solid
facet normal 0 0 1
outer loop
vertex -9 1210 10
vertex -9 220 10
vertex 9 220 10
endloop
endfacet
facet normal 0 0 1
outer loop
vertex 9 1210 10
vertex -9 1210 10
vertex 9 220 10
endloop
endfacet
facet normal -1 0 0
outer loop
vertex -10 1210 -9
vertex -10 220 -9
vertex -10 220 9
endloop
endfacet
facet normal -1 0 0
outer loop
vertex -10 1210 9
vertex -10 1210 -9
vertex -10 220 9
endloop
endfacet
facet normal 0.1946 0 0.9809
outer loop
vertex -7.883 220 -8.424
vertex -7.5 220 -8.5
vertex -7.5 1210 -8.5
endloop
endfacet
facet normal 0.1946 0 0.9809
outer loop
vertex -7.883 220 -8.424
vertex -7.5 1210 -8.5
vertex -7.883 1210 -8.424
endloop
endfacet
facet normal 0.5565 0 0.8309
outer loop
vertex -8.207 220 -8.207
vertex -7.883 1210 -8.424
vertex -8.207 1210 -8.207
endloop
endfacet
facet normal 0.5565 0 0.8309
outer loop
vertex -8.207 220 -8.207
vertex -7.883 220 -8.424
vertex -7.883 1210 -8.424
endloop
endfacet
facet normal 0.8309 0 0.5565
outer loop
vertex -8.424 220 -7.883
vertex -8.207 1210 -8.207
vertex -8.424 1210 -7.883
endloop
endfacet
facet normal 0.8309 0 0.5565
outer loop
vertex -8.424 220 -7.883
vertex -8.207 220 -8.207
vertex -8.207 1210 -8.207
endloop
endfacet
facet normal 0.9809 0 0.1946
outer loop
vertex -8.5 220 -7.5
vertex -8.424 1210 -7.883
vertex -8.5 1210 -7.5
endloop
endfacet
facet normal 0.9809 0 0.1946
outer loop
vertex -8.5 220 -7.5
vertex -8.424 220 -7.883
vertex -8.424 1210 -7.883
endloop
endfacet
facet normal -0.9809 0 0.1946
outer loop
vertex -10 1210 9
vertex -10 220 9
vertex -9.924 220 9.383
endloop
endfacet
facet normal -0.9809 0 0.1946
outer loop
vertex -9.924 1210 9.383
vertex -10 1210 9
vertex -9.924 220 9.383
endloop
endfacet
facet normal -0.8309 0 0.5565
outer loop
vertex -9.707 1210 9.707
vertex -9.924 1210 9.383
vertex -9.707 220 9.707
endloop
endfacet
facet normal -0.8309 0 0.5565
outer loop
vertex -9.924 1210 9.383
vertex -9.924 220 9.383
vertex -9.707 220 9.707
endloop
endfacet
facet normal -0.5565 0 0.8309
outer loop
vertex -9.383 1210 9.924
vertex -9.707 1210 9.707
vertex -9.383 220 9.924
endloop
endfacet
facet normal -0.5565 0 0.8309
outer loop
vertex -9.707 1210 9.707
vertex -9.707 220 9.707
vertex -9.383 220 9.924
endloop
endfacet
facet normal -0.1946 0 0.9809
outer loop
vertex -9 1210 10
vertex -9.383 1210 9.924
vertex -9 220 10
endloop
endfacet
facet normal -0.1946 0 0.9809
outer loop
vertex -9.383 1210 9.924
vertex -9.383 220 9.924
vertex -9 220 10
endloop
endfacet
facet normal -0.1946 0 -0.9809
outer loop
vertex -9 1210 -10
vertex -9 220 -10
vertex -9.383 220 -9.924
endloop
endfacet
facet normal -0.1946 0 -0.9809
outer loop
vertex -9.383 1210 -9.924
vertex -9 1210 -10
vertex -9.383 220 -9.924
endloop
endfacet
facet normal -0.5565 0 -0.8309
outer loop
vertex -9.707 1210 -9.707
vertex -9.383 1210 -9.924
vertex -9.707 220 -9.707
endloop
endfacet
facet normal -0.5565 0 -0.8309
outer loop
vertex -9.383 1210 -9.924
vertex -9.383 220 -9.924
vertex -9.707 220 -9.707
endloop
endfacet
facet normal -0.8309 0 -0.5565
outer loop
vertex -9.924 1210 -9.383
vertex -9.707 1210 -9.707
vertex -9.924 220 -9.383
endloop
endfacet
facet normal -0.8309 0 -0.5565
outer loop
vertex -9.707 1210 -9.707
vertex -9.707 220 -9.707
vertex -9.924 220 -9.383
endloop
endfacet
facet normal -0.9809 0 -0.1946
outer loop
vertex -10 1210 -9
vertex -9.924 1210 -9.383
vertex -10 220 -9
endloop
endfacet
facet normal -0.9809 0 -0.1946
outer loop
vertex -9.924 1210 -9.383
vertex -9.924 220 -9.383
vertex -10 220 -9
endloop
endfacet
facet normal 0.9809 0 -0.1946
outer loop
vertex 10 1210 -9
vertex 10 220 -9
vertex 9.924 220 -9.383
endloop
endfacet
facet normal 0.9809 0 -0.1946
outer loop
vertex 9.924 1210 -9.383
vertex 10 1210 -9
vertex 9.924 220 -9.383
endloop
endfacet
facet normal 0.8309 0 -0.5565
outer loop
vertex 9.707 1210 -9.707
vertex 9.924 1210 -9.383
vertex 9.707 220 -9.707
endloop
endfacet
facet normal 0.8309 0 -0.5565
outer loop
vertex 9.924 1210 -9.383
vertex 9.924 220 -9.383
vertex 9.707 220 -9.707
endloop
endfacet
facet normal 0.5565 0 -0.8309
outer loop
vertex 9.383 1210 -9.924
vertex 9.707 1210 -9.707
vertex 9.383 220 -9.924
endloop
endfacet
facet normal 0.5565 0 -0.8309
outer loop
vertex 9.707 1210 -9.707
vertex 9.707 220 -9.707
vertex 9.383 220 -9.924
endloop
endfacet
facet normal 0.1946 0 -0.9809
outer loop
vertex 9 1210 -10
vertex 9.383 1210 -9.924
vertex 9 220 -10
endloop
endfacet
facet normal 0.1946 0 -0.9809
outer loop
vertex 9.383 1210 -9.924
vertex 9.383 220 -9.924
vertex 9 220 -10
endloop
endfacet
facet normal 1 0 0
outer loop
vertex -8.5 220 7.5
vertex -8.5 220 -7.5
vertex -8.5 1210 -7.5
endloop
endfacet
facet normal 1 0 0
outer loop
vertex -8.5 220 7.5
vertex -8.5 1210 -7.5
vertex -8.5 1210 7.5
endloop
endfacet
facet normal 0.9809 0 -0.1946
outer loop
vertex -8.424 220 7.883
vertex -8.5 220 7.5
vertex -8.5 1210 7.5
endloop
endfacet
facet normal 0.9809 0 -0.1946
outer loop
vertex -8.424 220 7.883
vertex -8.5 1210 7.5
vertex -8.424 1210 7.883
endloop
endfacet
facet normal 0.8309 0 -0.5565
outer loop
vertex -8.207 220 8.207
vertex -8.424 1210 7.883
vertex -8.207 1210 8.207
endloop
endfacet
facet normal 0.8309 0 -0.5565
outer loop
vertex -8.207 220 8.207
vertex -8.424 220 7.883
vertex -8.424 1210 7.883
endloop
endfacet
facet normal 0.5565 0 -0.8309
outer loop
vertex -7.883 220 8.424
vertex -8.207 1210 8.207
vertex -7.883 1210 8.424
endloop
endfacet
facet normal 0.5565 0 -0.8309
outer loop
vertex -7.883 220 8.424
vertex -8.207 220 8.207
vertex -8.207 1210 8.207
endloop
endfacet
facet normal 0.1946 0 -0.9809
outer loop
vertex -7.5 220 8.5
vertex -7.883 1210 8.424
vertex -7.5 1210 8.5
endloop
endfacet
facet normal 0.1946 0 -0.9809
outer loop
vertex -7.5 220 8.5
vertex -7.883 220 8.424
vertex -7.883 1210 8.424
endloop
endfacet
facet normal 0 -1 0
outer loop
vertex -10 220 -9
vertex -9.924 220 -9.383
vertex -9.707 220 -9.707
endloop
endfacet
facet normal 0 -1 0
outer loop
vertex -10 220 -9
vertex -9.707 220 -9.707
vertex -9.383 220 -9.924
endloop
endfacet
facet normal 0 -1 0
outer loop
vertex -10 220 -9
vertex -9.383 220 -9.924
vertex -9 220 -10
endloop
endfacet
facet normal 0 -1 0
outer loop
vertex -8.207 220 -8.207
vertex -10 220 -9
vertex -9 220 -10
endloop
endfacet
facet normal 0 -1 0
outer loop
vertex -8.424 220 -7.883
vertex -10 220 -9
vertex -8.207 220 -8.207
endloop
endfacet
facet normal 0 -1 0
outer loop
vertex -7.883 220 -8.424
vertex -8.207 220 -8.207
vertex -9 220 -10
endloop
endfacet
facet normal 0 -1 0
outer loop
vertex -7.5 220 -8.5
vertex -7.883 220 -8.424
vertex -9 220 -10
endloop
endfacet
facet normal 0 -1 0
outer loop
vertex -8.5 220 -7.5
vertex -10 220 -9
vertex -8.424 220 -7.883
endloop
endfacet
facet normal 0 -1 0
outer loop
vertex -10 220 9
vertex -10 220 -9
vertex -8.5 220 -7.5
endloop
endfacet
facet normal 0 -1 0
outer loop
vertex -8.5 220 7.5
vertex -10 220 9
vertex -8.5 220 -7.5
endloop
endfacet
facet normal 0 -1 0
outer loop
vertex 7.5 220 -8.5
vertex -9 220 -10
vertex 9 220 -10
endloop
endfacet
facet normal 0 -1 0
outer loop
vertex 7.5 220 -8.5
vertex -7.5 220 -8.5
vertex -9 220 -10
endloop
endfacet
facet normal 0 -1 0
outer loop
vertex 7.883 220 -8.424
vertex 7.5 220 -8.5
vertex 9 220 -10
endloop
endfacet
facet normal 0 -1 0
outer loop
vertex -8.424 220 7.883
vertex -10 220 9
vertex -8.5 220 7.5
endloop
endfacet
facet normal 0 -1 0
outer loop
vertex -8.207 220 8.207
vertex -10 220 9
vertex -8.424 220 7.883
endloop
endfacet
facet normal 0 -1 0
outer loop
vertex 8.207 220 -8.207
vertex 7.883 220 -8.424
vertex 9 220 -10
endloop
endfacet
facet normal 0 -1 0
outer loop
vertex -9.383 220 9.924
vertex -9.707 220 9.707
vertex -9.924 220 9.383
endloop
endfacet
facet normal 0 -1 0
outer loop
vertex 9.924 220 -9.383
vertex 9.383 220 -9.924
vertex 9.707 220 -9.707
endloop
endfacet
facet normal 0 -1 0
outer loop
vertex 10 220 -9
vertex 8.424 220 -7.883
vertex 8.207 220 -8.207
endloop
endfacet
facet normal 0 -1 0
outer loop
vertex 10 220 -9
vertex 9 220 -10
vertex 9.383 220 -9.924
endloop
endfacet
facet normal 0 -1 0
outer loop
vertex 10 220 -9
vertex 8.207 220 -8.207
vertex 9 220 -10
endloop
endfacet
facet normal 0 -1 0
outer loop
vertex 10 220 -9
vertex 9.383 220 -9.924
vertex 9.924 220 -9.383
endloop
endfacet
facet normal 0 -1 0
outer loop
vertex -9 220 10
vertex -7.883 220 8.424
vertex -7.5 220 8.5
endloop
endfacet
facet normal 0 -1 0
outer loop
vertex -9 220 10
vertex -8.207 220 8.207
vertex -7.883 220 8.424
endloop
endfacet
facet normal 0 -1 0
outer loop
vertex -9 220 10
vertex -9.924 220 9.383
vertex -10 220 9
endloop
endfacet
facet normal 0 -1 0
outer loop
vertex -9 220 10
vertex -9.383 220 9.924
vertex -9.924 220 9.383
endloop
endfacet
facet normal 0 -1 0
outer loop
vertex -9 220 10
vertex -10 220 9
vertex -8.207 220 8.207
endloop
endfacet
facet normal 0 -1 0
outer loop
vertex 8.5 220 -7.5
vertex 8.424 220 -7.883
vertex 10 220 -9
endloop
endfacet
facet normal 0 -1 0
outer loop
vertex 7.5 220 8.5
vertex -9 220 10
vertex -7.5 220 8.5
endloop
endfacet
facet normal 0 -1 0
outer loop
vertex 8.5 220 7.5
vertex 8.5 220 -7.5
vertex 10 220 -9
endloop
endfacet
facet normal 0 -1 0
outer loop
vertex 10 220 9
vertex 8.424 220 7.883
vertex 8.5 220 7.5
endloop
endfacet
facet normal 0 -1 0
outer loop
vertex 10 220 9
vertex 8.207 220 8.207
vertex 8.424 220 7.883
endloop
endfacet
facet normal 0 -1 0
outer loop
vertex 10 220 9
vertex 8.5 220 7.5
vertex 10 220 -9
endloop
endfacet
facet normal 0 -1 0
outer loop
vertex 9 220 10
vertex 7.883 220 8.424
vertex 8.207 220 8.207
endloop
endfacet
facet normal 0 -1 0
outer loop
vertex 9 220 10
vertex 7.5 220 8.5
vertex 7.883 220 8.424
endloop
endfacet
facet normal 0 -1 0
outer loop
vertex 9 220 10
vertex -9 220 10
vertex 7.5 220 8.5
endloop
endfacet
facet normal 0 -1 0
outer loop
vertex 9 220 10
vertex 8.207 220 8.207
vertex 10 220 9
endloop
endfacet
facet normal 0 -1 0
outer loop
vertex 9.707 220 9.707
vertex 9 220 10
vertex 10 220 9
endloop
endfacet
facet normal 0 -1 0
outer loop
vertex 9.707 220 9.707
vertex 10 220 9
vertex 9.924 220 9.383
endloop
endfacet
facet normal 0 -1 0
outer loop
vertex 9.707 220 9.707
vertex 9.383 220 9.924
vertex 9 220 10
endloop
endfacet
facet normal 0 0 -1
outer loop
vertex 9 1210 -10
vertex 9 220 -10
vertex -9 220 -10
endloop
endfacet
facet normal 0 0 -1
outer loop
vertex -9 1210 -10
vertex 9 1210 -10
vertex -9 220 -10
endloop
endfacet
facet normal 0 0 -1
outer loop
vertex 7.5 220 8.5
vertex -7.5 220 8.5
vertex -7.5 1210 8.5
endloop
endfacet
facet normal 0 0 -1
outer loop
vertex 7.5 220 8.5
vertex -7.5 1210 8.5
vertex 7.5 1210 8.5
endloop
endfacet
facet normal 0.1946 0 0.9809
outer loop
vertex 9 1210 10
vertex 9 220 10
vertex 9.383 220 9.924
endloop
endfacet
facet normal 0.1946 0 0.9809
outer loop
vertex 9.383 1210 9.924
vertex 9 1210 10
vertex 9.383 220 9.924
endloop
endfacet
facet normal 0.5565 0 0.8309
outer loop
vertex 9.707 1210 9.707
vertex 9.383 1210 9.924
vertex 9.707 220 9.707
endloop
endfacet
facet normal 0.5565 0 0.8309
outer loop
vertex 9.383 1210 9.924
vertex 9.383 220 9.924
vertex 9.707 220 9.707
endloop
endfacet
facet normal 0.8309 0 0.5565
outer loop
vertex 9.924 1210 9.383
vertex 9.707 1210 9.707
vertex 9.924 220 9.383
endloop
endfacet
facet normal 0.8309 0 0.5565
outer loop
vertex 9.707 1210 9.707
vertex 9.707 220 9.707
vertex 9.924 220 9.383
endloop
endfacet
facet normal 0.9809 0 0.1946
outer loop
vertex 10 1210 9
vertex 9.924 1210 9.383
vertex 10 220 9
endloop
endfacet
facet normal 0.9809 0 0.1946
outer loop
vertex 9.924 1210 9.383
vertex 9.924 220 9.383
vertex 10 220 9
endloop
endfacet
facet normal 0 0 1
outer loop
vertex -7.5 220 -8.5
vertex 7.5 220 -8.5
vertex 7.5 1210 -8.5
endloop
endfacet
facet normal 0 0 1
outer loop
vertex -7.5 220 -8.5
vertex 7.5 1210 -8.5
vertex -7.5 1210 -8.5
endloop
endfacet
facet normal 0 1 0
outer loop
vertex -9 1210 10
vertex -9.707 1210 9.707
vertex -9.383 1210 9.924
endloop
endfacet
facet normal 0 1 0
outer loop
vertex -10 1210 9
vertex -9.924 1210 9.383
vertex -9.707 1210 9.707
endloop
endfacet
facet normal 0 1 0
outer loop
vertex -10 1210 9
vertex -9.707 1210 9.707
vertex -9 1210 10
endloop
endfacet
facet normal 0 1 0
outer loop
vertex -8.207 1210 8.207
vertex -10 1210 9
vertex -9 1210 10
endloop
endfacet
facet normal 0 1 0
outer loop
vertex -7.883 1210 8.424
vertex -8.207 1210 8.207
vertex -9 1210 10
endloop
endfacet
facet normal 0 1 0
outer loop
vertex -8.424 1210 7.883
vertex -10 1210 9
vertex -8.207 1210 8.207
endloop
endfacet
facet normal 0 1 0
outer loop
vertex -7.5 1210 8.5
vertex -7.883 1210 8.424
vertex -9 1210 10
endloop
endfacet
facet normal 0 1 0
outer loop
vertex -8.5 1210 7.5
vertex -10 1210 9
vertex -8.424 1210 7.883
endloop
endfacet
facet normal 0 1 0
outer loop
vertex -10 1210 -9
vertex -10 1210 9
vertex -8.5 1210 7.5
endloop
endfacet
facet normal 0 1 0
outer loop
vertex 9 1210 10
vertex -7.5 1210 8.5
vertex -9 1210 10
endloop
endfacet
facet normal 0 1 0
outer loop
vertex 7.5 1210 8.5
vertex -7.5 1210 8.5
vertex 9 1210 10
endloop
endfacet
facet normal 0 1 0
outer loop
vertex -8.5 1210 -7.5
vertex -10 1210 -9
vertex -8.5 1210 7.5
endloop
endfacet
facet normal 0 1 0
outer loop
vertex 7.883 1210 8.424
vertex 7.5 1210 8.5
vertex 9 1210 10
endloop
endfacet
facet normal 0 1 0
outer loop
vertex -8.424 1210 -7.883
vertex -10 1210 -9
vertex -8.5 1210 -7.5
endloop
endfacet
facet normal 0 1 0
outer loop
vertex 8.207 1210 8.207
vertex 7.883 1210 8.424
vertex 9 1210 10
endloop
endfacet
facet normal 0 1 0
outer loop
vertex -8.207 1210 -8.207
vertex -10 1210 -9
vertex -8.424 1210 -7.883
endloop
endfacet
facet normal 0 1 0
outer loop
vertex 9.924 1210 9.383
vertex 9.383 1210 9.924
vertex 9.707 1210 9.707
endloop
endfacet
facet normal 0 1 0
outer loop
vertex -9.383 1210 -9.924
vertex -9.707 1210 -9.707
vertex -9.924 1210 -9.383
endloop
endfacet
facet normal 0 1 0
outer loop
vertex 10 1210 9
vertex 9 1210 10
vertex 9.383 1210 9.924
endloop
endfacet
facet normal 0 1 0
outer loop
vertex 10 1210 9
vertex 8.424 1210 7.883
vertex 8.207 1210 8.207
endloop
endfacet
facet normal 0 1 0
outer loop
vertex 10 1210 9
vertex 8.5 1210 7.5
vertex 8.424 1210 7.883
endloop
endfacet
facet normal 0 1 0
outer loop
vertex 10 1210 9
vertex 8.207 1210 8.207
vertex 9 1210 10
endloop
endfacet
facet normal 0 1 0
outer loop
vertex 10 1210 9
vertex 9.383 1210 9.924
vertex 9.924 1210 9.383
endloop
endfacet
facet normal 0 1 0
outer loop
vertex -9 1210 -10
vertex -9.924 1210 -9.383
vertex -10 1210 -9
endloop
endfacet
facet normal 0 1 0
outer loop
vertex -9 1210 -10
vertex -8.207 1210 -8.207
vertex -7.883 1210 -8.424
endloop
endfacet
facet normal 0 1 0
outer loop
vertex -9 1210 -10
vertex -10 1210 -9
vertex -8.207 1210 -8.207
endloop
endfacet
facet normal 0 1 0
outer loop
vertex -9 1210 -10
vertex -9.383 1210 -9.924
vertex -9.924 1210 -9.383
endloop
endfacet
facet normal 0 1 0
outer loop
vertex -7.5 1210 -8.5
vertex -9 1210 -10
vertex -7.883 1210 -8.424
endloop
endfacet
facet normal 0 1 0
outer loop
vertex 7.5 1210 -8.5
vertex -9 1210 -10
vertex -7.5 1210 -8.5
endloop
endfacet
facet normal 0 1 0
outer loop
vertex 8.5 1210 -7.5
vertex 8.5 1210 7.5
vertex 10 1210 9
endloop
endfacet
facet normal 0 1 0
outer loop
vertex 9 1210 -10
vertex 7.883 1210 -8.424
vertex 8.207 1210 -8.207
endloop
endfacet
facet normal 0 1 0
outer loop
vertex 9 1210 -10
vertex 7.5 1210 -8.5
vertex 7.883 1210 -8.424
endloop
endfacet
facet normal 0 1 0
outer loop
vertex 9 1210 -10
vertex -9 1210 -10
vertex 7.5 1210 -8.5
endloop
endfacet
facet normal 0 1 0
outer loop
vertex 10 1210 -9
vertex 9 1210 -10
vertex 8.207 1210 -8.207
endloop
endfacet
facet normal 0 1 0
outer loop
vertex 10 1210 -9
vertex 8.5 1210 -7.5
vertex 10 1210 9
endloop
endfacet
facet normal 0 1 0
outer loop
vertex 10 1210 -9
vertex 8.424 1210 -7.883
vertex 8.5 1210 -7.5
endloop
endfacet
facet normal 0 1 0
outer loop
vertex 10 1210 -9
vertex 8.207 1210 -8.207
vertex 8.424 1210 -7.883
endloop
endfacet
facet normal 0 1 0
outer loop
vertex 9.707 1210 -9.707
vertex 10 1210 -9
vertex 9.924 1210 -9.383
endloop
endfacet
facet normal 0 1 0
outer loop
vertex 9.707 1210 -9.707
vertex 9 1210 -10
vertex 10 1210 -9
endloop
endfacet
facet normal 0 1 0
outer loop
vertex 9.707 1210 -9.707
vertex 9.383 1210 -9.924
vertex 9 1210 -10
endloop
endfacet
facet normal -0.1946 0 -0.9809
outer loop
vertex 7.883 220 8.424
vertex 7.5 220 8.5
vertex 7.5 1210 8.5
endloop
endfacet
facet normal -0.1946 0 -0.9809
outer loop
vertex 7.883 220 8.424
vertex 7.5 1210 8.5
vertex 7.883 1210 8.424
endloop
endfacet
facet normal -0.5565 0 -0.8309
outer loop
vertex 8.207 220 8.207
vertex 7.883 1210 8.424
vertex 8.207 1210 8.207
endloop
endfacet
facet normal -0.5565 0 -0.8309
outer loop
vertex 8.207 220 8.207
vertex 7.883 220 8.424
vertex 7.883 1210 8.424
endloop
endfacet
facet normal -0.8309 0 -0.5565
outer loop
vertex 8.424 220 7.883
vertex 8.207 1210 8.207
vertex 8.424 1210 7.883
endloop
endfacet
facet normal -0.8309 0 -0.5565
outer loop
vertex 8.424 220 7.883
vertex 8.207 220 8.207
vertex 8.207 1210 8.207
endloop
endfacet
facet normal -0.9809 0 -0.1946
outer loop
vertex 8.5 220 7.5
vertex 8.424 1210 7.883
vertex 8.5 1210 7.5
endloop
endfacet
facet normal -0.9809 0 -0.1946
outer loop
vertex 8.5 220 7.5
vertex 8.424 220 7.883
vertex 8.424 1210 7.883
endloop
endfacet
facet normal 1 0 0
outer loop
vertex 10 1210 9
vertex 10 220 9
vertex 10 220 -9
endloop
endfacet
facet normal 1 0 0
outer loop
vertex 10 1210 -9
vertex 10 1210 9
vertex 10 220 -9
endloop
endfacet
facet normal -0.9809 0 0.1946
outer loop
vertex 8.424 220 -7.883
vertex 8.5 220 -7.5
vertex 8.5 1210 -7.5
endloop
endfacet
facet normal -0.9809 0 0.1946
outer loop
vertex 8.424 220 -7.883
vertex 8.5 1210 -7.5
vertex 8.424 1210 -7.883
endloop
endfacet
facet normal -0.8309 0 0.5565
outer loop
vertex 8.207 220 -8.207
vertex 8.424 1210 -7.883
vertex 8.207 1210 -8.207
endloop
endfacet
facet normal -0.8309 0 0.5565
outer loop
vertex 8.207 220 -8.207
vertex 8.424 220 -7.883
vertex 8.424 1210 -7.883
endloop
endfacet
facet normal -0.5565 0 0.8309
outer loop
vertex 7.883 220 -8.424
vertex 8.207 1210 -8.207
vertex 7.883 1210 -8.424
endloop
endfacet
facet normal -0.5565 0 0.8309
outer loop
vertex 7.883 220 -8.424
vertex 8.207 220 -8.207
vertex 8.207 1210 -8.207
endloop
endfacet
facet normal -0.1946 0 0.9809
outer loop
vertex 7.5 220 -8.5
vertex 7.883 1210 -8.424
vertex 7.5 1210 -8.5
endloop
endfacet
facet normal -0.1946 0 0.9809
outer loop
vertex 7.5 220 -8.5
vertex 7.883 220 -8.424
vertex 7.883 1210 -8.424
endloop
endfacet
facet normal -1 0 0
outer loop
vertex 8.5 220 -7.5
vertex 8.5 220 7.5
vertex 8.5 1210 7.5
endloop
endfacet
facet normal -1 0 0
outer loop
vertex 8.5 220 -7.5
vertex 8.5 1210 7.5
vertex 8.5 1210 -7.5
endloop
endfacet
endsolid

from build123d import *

# Parameters (mm, degrees)
BOSS_EXTRUDE1_DEPTH = 1210
SKETCH2_W           = 101.895059676
SKETCH2_H           = 138.127514373
CUT_EXTRUDE1_DEPTH  = 220


with BuildPart() as part:
    # Sketch1 → Boss-Extrude1 (new body)
    with BuildSketch(Plane(origin=(0, 0, 0), x_dir=(1, 0, 0), z_dir=(0, 1, 0))):
        with BuildLine():
            Line((-9, -10), (9, -10))
            ThreePointArc((9, -10), (9.707106781, -9.707106781), (10, -9))
            Line((10, -9), (10, 9))
            ThreePointArc((10, 9), (9.707106781, 9.707106781), (9, 10))
            Line((9, 10), (-9, 10))
            ThreePointArc((-9, 10), (-9.707106781, 9.707106781), (-10, 9))
            Line((-10, 9), (-10, -9))
            ThreePointArc((-10, -9), (-9.707106781, -9.707106781), (-9, -10))
        make_face()
        with BuildLine():
            Line((-7.5, -8.5), (7.5, -8.5))
            ThreePointArc((7.5, -8.5), (8.207106781, -8.207106781), (8.5, -7.5))
            Line((8.5, -7.5), (8.5, 7.5))
            ThreePointArc((8.5, 7.5), (8.207106781, 8.207106781), (7.5, 8.5))
            Line((7.5, 8.5), (-7.5, 8.5))
            ThreePointArc((-7.5, 8.5), (-8.207106781, 8.207106781), (-8.5, 7.5))
            Line((-8.5, 7.5), (-8.5, -7.5))
            ThreePointArc((-8.5, -7.5), (-8.207106781, -8.207106781), (-7.5, -8.5))
        make_face(mode=Mode.SUBTRACT)
    extrude(amount=BOSS_EXTRUDE1_DEPTH)

    # Sketch2 → Cut-Extrude1 (cut)
    with BuildSketch(Plane.XZ):
        with Locations((4.315799724, -16.6218454)):
            Rectangle(SKETCH2_W, SKETCH2_H)
    extrude(amount=-CUT_EXTRUDE1_DEPTH, mode=Mode.SUBTRACT)


solid = part.part
